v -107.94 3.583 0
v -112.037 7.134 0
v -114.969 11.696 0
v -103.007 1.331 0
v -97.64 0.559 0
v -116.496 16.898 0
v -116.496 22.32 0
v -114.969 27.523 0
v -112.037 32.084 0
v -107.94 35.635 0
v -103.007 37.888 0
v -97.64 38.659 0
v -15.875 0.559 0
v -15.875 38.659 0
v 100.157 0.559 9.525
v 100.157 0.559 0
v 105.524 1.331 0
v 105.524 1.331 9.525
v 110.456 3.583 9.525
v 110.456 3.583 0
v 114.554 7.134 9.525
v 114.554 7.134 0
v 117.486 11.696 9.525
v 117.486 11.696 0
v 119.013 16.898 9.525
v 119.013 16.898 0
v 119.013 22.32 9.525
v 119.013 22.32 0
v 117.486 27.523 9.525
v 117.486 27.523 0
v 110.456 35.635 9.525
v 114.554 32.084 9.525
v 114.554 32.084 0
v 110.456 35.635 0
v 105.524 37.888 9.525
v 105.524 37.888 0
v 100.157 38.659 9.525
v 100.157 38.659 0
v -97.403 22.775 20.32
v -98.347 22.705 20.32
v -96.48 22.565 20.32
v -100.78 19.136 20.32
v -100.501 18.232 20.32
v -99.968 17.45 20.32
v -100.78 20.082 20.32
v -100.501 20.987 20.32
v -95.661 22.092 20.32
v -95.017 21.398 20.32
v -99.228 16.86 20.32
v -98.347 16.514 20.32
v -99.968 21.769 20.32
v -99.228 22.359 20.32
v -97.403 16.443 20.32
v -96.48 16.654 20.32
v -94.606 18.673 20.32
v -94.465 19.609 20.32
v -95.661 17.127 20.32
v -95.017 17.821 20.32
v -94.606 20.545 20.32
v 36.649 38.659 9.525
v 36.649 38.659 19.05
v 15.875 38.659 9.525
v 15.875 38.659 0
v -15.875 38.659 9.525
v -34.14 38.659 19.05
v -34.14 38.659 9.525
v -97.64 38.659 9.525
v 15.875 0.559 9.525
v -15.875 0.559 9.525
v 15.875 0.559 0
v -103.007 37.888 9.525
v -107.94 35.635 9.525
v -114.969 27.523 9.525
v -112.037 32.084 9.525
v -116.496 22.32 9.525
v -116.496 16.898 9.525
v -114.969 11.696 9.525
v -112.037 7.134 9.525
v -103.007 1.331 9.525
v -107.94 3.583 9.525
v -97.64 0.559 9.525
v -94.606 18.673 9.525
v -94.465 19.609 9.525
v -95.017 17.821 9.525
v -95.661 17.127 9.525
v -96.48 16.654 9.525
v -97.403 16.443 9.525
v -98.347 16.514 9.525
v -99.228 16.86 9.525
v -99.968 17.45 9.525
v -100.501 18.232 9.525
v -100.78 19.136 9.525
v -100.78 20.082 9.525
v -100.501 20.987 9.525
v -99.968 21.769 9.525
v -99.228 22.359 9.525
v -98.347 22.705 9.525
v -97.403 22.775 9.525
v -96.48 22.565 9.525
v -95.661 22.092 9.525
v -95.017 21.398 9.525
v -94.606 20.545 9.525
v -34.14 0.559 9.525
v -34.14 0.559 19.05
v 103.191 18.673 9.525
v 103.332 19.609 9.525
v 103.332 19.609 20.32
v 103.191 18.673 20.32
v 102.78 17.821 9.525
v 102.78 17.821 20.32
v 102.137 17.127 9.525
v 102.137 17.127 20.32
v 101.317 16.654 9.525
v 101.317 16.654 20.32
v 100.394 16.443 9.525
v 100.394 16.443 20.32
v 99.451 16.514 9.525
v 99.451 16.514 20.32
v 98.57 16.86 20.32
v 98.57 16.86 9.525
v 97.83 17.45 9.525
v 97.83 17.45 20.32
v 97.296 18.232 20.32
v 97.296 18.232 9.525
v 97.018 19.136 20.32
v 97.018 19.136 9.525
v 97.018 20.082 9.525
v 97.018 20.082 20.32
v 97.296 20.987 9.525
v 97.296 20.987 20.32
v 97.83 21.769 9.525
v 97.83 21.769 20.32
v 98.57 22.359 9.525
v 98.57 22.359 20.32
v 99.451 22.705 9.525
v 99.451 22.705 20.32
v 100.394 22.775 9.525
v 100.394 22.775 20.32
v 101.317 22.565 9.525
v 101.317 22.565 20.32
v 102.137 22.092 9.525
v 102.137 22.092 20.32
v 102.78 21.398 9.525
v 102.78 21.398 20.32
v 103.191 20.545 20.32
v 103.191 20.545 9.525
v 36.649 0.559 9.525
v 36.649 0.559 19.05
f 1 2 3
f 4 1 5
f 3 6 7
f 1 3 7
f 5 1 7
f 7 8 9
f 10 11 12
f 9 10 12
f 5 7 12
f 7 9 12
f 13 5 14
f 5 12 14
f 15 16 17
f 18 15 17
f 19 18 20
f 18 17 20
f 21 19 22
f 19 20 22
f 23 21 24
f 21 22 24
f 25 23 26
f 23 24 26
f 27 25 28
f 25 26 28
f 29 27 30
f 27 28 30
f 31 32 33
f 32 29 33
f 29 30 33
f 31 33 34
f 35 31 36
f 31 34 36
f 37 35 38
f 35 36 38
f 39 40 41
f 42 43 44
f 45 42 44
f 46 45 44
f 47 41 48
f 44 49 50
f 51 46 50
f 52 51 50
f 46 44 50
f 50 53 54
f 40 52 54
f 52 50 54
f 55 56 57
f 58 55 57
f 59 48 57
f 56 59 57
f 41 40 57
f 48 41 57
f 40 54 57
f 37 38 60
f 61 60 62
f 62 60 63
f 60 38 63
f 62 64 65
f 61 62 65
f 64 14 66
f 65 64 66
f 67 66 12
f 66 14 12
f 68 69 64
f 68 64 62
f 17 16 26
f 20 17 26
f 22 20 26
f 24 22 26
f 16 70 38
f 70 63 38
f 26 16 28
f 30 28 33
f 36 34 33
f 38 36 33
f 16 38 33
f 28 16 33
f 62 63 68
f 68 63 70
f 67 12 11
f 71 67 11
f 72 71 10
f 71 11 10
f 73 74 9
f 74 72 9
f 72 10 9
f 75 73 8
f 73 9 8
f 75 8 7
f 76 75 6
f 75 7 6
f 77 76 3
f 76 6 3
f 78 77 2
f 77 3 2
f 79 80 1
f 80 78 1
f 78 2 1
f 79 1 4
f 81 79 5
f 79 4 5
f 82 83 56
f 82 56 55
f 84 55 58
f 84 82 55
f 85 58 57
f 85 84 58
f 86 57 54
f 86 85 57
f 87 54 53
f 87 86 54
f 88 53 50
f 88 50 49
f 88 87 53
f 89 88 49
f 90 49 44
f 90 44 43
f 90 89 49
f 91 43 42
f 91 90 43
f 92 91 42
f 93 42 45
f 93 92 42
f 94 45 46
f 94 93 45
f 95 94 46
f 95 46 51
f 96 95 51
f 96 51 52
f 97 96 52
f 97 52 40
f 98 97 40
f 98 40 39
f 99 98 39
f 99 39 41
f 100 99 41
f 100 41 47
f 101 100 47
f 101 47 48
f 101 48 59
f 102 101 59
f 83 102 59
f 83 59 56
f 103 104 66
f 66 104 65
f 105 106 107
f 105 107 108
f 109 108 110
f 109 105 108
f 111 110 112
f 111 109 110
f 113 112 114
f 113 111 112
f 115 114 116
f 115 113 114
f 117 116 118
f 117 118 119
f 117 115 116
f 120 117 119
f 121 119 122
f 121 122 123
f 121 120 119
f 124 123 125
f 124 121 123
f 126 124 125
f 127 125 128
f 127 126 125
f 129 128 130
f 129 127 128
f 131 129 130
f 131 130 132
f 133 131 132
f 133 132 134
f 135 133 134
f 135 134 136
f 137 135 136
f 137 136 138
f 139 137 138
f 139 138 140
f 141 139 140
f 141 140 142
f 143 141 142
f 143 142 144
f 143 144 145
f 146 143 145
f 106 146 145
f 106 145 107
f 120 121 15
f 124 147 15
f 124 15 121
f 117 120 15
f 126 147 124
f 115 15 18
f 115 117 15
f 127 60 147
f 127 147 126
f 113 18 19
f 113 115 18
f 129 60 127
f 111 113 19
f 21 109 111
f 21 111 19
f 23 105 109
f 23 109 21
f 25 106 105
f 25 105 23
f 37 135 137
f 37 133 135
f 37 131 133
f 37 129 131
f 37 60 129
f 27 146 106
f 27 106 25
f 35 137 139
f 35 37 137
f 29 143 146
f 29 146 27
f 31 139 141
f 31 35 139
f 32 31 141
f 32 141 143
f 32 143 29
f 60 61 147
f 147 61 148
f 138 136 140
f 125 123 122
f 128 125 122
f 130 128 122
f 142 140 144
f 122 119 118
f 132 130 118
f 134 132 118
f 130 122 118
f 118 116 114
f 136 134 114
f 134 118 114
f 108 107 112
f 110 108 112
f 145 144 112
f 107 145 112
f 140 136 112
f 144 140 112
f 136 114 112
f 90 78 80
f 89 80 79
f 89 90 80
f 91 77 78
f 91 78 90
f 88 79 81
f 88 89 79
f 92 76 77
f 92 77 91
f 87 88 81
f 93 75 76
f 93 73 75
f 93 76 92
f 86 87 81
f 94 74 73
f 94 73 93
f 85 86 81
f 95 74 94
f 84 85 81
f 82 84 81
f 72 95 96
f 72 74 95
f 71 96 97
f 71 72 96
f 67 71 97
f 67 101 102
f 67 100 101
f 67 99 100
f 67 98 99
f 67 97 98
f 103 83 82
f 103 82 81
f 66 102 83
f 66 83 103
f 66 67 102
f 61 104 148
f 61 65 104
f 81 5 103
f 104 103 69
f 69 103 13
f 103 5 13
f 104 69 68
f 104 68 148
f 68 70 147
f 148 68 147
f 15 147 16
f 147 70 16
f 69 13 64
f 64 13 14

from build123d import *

# Parameters (mm, degrees)
F0_R     = 3.175
F1_DEPTH = 19.05
F2_R     = 3.175
F3_DEPTH = 9.525
F4_W     = 15.875
F4_H     = 31.190733
F5_DEPTH = 9.525
F6_R     = 3.175
F7_DEPTH = 20.32
F8_R     = 3.175
F9_DEPTH = 20.32


with BuildPart() as f1:
    # F0 (on Top) → F1 (new body)
    with BuildSketch(Plane.XY):
        with BuildLine():
            ThreePointArc((100.157061, 0.559267), (119.207061, 19.609267), (100.157061, 38.659267))
            Line((100.157061, 38.659267), (-97.640359, 38.659267))
            ThreePointArc((-97.640359, 38.659267), (-116.690359, 19.609267), (-97.640359, 0.559267))
            Line((-97.640359, 0.559267), (100.157061, 0.559267))
        make_face()
        with Locations((-97.640359, 19.609267)):
            Circle(F0_R, mode=Mode.SUBTRACT)
        with Locations((100.157061, 19.609267)):
            Circle(F0_R, mode=Mode.SUBTRACT)
    extrude(amount=F1_DEPTH)

    # F2 (on face) → F3 (cut)
    with BuildSketch(Plane.XY.offset(19.05)):
        with Locations((-97.640359, 19.609267)):
            Circle(F2_R)
        with Locations((100.157061, 19.609267)):
            Circle(F2_R)
        with BuildLine():
            ThreePointArc((100.149441, -5.790733), (125.549441, 19.609267), (100.149441, 45.009267))
            Line((100.149441, 45.009267), (36.649441, 45.009267))
            Line((36.649441, 45.009267), (36.649441, -5.790733))
            Line((36.649441, -5.790733), (100.149441, -5.790733))
        make_face()
        with Locations((100.157061, 19.609267)):
            Circle(F2_R, mode=Mode.SUBTRACT)
        with BuildLine():
            Line((-34.140359, -5.790733), (-34.140359, 45.009267))
            Line((-34.140359, 45.009267), (-97.640359, 45.009267))
            ThreePointArc((-97.640359, 45.009267), (-123.040359, 19.609267), (-97.640359, -5.790733))
            Line((-97.640359, -5.790733), (-34.140359, -5.790733))
        make_face()
        with Locations((-97.640359, 19.609267)):
            Circle(F2_R, mode=Mode.SUBTRACT)
    extrude(amount=-F3_DEPTH, mode=Mode.SUBTRACT)

    # F4 (on face) → F5 (cut)
    with BuildSketch(Plane(origin=(0, 0, 0), x_dir=(1, 0, 0), z_dir=(0, 0, -1))):
        Polygon((-15.875, 0), (-15.875, -19.609267), (0, -19.609267), (15.875, -19.609267), (15.875, 0), align=None)
        with Locations((-7.9375, -35.204633)):
            Rectangle(F4_W, F4_H)
        with Locations((7.9375, -35.204633)):
            Rectangle(F4_W, F4_H)
    extrude(amount=-F5_DEPTH, mode=Mode.SUBTRACT)

    # F6 (on face) → F7 (join)
    with BuildSketch(Plane(origin=(0, 0, 0), x_dir=(1, 0, 0), z_dir=(0, 0, -1))):
        with Locations((-97.640359, -19.609267)):
            Circle(F6_R)
    extrude(amount=-F7_DEPTH)

    # F8 (on face) → F9 (join)
    with BuildSketch(Plane(origin=(0, 0, 0), x_dir=(1, 0, 0), z_dir=(0, 0, -1))):
        with Locations((100.157061, -19.609267)):
            Circle(F8_R)
    extrude(amount=-F9_DEPTH)


solid = f1.part
